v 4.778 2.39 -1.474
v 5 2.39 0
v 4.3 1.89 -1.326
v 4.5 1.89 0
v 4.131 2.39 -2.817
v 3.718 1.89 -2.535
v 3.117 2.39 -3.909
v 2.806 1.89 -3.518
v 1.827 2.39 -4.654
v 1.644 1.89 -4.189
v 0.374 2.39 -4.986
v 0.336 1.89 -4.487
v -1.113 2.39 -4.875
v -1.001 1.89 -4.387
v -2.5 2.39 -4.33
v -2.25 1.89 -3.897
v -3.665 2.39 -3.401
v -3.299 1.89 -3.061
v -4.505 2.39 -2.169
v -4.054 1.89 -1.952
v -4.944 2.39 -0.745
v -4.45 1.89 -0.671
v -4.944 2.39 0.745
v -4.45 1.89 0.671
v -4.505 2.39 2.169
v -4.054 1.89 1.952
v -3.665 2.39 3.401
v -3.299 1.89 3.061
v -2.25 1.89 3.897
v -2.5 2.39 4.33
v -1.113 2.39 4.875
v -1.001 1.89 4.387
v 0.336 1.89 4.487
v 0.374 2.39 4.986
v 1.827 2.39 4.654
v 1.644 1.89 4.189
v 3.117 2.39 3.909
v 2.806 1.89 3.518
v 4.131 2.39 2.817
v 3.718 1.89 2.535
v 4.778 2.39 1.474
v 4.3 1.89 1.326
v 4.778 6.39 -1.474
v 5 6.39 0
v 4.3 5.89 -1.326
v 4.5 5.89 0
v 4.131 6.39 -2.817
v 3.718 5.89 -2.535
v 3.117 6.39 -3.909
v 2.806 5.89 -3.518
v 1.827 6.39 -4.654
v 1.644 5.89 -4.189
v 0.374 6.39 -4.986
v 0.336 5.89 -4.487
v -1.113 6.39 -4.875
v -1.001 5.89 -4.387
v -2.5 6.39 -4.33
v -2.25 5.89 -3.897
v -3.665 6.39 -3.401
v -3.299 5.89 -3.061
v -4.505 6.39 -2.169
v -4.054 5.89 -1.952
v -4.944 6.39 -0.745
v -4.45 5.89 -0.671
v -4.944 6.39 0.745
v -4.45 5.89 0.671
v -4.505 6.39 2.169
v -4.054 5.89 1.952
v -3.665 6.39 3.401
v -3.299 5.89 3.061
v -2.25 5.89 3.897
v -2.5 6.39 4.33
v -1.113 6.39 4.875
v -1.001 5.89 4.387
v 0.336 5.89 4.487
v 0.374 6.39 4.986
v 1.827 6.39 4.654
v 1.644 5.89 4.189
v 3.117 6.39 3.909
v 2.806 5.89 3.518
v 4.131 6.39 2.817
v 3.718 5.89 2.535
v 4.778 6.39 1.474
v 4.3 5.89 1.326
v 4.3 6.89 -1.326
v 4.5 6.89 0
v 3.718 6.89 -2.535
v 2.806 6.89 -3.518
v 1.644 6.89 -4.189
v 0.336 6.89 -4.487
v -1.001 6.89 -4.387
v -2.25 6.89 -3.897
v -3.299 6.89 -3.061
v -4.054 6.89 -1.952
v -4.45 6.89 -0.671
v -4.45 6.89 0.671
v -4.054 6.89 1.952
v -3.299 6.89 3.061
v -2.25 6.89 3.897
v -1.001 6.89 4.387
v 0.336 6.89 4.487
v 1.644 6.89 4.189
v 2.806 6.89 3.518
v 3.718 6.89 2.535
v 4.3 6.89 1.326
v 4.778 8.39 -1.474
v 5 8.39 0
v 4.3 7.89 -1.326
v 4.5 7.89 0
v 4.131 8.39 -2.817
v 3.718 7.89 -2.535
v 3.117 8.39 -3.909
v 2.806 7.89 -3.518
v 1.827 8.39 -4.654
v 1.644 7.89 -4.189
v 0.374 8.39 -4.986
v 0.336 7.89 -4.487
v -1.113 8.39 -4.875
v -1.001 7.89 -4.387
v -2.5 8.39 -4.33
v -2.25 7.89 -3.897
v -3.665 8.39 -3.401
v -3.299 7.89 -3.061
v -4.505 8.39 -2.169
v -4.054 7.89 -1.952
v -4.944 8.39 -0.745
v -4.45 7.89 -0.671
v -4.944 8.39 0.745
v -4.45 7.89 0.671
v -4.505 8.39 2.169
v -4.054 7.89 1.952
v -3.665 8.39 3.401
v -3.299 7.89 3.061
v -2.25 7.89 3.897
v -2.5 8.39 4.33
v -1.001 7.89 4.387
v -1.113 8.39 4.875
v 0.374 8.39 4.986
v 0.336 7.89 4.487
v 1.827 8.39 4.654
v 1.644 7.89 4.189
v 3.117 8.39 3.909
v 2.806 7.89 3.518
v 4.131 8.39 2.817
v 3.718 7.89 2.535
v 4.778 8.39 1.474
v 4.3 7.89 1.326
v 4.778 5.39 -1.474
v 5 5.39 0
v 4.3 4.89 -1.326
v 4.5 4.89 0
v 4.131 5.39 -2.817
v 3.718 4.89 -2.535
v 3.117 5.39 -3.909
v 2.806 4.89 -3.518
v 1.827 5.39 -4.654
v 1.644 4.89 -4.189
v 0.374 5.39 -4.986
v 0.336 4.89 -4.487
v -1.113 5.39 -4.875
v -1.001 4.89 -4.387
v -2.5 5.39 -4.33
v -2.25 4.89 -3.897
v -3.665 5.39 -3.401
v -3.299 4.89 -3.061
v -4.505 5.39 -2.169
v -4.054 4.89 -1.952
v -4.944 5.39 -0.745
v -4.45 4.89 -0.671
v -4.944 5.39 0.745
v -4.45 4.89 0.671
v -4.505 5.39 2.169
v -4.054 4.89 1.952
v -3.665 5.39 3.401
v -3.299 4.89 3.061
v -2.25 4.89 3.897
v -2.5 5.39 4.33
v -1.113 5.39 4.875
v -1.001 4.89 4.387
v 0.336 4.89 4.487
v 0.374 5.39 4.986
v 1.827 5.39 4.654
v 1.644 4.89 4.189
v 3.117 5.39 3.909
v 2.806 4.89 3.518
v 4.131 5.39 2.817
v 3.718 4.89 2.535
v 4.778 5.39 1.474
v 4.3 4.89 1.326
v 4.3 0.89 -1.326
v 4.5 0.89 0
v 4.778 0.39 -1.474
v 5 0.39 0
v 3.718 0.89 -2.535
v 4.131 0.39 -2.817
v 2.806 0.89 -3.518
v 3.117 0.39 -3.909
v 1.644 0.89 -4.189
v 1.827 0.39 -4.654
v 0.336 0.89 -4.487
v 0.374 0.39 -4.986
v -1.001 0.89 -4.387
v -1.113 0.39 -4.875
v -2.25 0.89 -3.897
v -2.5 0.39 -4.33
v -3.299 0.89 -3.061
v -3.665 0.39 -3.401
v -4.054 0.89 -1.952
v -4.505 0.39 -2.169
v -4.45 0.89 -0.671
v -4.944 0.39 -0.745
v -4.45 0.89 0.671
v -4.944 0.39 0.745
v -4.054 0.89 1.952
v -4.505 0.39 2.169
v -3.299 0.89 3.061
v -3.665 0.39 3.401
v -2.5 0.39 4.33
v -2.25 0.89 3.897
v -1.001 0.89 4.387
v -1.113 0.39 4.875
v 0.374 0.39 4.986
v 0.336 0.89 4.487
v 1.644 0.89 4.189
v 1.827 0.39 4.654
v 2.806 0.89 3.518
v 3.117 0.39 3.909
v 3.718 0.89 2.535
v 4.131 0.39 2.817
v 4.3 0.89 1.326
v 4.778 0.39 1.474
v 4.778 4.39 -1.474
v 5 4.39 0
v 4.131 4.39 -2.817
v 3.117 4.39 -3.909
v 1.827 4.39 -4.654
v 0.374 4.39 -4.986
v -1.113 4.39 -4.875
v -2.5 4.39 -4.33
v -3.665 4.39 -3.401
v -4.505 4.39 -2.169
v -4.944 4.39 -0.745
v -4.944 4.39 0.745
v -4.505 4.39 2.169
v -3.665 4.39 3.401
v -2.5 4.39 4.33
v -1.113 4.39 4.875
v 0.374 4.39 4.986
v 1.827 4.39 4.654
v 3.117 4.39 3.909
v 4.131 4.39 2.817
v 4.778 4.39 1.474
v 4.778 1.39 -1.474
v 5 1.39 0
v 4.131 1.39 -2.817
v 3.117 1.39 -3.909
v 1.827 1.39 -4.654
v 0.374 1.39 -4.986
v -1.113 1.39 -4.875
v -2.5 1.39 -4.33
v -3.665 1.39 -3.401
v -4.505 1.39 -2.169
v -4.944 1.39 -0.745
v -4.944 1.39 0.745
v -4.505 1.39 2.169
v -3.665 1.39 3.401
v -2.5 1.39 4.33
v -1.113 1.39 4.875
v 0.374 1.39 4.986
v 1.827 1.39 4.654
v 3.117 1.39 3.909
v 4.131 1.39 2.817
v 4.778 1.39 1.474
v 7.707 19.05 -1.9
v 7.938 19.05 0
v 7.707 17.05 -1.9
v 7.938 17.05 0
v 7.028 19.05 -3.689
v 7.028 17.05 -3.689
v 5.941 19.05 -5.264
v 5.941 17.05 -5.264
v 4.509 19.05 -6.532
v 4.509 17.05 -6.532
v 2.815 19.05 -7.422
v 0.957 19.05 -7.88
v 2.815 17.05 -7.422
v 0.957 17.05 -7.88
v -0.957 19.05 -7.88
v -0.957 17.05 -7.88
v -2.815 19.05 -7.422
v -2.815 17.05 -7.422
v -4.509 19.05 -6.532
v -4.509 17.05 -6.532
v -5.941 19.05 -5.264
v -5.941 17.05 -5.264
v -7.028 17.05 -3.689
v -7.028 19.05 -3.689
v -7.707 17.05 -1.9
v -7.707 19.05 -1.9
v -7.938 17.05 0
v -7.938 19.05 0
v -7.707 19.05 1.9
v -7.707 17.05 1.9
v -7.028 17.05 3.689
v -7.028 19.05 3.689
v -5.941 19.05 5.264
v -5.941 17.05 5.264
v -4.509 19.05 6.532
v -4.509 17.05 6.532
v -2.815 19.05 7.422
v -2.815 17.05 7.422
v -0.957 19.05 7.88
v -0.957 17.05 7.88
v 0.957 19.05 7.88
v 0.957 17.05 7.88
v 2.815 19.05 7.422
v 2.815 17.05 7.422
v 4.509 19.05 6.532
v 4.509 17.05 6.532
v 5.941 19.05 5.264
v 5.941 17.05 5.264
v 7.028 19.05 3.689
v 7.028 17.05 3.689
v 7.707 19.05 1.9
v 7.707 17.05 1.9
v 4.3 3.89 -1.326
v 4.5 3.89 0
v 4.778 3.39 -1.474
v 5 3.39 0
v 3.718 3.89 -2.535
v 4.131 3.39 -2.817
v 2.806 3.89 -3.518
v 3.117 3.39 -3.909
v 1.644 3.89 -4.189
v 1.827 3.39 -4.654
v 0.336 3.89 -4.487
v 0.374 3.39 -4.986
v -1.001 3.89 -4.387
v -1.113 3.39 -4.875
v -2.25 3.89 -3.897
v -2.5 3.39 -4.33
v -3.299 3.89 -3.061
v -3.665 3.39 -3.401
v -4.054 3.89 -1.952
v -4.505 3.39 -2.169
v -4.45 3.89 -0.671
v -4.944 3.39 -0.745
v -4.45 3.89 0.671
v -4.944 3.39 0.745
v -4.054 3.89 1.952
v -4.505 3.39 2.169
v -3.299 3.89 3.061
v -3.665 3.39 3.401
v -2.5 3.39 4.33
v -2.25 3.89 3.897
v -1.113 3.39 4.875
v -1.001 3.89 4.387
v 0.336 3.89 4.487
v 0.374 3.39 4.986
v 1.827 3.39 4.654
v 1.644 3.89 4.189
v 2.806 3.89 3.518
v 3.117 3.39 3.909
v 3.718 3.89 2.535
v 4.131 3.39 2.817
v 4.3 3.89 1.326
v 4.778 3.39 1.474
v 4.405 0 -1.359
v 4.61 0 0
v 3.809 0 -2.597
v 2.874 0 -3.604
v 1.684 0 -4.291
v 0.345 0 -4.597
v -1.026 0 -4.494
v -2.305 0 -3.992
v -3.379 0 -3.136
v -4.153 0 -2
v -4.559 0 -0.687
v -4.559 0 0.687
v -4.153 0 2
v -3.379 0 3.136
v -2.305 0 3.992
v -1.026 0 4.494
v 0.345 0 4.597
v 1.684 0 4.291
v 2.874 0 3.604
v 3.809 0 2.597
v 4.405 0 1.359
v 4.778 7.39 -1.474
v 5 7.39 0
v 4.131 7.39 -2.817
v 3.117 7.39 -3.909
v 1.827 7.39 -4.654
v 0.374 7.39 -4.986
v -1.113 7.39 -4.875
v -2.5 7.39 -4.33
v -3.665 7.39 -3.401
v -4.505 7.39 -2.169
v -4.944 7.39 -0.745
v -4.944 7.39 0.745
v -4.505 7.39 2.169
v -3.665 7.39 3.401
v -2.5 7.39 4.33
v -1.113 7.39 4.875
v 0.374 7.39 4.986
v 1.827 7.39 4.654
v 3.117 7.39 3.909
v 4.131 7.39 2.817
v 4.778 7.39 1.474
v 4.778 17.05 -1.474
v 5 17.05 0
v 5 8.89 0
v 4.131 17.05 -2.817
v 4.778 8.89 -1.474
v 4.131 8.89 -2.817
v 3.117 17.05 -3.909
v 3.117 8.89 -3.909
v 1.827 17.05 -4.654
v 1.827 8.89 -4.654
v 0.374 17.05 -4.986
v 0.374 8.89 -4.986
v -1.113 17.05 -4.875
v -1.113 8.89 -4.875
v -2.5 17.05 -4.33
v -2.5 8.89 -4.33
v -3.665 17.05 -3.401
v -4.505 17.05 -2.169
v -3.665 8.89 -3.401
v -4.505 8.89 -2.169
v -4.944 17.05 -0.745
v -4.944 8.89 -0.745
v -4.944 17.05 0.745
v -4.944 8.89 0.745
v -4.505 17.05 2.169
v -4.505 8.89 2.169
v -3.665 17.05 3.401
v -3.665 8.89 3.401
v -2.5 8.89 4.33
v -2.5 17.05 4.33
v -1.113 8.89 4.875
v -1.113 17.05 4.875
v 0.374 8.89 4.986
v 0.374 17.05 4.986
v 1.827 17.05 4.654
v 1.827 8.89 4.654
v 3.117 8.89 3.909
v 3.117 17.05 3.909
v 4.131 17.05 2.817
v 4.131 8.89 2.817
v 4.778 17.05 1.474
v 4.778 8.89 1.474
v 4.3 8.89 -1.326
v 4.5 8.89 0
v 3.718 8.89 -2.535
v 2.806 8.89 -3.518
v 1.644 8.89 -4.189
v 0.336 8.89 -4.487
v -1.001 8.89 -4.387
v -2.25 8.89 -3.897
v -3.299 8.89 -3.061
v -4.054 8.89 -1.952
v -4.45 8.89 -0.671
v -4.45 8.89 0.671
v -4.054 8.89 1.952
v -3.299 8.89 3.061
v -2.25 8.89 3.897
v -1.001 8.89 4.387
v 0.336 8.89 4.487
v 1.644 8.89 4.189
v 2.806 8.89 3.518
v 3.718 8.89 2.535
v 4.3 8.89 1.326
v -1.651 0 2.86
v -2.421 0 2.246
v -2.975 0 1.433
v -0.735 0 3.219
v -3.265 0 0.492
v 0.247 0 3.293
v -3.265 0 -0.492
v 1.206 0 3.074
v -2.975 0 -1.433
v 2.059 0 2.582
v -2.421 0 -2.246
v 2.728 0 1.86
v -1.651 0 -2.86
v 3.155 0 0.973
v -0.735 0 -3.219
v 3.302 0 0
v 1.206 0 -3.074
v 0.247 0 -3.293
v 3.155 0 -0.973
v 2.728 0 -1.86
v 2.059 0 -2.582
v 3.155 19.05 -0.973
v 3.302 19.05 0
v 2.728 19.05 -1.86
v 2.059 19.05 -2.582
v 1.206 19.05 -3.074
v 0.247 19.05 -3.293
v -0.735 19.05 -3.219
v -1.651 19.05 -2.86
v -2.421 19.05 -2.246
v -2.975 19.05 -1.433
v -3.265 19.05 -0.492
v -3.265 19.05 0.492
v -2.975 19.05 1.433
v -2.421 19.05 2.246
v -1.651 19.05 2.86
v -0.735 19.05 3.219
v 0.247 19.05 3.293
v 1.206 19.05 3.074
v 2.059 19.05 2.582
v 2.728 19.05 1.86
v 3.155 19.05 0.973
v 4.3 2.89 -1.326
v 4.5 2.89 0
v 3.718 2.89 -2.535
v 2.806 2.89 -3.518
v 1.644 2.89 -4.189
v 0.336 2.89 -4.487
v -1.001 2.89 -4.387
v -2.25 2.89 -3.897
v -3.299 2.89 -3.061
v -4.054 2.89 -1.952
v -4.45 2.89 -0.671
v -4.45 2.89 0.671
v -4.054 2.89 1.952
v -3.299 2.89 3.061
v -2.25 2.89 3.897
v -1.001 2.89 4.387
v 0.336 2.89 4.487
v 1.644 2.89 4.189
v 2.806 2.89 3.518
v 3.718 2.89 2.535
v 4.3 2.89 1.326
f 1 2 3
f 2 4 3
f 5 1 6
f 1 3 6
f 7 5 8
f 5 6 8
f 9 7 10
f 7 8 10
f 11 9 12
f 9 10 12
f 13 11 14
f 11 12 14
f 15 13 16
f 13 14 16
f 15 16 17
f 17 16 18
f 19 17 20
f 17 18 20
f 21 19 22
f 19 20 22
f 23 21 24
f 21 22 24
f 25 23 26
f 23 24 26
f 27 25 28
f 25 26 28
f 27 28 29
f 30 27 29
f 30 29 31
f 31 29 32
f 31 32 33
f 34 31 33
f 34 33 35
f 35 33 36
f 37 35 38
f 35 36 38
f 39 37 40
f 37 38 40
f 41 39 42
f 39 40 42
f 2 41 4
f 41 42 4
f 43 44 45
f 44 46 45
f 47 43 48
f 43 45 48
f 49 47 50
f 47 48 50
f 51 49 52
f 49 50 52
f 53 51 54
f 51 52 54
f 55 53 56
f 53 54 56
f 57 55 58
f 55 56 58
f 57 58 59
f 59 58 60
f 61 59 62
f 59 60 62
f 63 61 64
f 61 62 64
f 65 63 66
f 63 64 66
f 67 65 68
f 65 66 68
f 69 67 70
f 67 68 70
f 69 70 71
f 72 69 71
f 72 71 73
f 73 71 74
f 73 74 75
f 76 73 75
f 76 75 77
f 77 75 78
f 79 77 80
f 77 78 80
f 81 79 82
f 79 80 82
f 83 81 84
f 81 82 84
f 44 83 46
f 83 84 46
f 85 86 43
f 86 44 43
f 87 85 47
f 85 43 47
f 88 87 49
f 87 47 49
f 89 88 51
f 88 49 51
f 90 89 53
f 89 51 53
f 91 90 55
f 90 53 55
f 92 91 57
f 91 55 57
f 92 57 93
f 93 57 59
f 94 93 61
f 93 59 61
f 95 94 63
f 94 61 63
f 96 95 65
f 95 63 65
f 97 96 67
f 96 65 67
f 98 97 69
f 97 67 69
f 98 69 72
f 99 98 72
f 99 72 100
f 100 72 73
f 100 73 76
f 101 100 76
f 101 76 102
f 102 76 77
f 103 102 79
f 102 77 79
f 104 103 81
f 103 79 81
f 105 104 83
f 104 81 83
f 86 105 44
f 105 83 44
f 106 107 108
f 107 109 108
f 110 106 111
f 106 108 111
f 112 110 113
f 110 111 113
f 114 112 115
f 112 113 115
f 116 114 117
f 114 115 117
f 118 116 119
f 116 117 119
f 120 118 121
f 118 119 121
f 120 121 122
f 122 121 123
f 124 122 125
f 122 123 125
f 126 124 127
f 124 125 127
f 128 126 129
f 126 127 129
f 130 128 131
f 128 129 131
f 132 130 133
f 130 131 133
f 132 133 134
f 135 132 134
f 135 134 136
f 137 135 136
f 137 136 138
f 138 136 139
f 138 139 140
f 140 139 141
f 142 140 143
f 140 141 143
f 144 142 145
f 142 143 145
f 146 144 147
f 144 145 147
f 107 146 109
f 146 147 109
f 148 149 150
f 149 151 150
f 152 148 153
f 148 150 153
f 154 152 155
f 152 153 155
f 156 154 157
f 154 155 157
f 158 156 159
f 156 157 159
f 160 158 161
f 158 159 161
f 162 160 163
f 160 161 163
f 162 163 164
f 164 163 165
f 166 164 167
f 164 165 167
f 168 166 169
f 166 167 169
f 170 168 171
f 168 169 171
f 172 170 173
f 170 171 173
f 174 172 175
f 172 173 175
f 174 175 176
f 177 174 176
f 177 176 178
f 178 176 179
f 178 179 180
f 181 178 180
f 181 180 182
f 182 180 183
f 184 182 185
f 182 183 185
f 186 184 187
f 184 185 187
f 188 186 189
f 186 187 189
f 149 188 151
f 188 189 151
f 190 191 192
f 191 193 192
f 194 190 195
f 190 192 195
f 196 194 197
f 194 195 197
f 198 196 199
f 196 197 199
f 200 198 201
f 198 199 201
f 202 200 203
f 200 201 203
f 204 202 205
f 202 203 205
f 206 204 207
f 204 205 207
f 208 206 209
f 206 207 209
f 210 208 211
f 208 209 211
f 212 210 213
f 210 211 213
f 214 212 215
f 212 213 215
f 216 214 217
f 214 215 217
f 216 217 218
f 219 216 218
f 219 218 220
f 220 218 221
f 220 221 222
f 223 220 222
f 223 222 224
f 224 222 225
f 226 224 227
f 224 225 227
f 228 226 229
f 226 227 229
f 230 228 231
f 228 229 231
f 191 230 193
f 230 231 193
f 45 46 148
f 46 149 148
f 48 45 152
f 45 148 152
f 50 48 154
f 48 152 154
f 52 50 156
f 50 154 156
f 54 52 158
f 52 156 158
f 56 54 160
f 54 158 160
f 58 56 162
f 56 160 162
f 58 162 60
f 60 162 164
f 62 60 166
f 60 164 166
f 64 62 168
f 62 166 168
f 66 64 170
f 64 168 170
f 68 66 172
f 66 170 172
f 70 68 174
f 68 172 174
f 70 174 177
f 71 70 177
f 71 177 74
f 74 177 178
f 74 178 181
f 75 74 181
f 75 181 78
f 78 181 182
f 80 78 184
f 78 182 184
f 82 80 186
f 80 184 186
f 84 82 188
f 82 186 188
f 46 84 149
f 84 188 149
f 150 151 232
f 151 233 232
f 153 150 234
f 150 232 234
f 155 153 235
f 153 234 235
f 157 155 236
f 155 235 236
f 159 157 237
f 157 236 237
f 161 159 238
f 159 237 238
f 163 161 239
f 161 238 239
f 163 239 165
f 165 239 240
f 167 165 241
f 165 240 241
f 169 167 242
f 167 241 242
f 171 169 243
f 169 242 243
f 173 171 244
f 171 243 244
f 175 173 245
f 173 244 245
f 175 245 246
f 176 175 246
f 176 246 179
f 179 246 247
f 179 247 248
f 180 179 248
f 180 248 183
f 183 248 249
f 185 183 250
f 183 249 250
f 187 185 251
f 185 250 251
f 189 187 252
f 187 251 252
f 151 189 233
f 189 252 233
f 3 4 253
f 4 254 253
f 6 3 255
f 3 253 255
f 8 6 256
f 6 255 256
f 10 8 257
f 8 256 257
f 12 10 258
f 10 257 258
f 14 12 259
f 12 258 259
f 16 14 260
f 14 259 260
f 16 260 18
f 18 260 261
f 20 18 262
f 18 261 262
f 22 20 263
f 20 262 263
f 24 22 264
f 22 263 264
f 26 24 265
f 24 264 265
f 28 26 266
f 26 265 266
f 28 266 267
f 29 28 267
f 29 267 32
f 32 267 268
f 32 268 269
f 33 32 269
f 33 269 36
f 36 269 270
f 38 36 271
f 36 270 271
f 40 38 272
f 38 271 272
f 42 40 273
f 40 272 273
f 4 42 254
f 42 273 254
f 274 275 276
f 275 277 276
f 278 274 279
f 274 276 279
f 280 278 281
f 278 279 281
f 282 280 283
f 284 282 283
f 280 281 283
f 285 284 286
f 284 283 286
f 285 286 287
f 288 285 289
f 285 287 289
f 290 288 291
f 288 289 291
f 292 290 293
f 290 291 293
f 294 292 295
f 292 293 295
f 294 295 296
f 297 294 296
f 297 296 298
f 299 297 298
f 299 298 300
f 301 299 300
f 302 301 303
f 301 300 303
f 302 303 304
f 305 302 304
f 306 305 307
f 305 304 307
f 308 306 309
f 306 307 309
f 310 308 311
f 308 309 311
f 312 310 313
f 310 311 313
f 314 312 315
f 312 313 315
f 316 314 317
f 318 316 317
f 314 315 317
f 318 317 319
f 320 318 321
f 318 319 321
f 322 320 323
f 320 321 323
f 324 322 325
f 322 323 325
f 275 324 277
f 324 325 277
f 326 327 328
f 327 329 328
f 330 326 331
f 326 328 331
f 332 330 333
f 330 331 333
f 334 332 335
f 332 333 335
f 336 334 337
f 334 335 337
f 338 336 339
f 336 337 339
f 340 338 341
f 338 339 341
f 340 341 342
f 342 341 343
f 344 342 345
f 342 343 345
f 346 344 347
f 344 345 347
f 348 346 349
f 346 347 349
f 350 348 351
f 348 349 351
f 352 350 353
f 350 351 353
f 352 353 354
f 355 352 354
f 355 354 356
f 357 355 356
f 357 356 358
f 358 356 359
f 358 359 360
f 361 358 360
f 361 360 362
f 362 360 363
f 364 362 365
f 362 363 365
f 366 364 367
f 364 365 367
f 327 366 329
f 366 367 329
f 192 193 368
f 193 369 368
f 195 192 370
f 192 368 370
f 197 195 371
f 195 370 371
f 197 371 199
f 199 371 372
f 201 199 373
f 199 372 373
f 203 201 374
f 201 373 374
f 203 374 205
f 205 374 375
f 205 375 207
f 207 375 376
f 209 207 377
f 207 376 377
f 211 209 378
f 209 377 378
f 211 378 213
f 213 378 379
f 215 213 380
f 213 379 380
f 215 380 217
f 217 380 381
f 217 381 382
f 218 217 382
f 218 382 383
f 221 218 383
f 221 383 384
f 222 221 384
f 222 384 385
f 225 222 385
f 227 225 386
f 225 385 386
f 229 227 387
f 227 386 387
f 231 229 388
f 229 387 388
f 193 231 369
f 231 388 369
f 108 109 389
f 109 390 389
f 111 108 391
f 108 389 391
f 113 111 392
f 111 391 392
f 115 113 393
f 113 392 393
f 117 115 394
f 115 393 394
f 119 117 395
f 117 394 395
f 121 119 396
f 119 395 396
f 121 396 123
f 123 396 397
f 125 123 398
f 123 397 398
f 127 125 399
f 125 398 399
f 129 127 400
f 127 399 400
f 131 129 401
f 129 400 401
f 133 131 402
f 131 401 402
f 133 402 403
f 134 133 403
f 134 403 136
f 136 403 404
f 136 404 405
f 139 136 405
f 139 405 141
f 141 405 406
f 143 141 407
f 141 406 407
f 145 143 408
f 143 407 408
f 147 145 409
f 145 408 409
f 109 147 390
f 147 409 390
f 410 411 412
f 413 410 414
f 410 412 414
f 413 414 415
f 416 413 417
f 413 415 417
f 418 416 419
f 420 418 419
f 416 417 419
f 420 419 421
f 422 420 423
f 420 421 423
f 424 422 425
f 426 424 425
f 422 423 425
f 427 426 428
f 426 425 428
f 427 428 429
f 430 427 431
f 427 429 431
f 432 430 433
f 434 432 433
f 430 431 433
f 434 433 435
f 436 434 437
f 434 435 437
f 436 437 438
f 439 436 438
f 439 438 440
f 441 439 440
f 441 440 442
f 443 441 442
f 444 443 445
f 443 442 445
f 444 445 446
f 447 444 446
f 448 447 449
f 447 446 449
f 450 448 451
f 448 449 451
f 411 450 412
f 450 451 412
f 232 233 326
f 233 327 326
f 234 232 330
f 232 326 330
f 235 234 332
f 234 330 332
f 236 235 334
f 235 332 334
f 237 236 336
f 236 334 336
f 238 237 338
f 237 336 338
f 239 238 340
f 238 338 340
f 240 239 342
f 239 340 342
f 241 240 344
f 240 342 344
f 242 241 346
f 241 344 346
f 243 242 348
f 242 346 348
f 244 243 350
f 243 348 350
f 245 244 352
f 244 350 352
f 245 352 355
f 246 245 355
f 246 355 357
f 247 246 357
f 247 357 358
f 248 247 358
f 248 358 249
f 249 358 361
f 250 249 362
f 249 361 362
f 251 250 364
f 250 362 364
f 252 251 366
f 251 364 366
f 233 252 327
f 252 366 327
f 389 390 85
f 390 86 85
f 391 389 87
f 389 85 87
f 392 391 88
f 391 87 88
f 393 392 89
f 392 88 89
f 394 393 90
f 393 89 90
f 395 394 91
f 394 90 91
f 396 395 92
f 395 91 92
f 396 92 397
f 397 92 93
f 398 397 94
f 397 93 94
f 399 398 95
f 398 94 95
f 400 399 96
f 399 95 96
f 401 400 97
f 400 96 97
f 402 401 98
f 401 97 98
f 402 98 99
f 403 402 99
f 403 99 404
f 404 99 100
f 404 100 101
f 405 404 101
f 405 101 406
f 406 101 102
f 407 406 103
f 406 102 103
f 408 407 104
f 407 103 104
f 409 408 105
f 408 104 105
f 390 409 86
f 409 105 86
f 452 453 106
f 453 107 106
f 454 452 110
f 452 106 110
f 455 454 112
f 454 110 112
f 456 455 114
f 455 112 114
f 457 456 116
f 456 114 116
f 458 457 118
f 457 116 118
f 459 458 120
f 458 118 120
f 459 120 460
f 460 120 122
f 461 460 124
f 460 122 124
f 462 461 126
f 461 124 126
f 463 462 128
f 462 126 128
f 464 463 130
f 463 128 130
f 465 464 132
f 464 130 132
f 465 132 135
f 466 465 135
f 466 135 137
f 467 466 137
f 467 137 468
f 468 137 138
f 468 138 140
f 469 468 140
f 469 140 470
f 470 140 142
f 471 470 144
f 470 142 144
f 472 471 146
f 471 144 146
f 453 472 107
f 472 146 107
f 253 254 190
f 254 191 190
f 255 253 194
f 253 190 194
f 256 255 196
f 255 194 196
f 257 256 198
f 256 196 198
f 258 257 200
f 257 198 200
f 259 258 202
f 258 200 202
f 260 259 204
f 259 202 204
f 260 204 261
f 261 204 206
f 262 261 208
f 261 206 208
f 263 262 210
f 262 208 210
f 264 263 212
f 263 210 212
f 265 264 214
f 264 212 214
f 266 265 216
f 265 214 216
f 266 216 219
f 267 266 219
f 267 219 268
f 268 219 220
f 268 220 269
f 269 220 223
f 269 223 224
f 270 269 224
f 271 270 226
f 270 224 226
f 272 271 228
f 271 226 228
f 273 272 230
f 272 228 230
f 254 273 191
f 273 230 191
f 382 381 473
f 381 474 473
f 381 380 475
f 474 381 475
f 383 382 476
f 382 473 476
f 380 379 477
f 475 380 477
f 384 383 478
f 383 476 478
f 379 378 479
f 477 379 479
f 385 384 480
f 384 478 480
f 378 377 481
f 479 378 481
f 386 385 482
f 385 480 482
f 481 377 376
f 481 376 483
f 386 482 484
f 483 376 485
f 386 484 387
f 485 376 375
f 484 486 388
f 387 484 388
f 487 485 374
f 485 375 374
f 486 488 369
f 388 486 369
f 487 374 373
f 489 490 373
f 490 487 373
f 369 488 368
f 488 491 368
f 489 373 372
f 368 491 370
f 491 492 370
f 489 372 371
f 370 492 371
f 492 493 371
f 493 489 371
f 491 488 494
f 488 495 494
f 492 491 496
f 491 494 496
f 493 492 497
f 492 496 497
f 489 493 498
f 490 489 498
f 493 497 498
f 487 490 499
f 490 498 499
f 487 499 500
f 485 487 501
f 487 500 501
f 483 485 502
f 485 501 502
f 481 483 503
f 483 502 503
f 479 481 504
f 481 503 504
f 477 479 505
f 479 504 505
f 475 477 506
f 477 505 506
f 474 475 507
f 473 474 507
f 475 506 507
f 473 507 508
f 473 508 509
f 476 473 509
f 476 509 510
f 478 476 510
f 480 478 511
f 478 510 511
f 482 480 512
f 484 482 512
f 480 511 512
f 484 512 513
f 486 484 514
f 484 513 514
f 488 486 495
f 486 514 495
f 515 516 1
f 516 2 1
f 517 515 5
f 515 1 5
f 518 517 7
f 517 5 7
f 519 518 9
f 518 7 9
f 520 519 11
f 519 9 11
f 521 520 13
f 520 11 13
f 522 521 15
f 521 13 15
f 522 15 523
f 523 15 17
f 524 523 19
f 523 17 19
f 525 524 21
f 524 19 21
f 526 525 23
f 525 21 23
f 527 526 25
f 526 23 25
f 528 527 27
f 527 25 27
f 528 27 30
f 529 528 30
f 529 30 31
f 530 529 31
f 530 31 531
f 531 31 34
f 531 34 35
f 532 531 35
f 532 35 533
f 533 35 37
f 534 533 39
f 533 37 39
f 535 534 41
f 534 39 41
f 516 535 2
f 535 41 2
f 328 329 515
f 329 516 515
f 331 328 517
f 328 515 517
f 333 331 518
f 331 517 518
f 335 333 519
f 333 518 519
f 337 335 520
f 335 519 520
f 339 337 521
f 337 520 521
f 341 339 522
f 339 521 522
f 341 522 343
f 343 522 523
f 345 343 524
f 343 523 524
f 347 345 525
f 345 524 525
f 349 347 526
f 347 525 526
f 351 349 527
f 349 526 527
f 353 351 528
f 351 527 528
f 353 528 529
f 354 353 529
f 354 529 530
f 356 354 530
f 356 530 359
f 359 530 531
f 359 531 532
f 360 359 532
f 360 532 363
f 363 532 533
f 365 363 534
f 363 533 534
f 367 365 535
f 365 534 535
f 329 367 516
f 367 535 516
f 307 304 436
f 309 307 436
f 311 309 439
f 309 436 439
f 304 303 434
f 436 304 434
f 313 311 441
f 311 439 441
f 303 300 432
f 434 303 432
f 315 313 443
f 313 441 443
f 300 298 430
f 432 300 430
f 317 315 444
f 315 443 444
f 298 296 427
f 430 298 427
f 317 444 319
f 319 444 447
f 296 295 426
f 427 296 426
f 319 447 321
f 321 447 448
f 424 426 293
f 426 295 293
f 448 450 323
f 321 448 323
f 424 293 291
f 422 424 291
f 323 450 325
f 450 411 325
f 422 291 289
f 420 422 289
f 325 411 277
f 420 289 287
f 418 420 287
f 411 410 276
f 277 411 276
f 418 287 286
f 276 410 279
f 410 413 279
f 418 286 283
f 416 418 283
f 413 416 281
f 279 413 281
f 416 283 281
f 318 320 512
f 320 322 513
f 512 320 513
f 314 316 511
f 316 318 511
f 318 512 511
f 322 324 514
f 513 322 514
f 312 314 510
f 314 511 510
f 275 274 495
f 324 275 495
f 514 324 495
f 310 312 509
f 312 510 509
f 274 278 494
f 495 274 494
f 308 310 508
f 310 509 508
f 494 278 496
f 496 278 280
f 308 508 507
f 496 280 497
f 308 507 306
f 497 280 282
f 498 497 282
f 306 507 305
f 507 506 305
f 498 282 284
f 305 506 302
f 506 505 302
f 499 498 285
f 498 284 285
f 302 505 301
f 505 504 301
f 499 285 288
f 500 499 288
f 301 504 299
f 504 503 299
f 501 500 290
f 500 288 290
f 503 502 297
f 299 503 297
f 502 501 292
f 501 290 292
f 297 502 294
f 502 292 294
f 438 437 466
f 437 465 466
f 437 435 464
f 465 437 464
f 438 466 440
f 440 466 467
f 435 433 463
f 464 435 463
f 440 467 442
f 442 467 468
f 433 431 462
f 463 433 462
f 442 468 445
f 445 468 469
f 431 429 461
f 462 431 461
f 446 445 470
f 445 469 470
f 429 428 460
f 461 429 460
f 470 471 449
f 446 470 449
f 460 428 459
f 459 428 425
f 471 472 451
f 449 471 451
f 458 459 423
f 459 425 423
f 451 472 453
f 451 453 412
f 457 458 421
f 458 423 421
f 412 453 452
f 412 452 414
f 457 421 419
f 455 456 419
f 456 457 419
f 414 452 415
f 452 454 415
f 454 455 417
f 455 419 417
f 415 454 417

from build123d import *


with BuildPart() as part:
    # Sketch1 → Revolve1 (revolve)
    with BuildSketch(Plane.XY):
        Polygon((3.302, 0), (3.302, 19.05), (7.9375, 19.05), (7.9375, 17.05), (5, 17.05), (5, 8.89), (4.5, 8.89), (5, 8.39), (4.5, 7.89), (5, 7.39), (4.5, 6.89), (5, 6.39), (4.5, 5.89), (5, 5.39), (4.5, 4.89), (5, 4.39), (4.5, 3.89), (5, 3.39), (4.5, 2.89), (5, 2.39), (4.5, 1.89), (5, 1.39), (4.5, 0.89), (5, 0.39), (4.61, 0), align=None)
    revolve(axis=Axis((0, 0, 0), (0, 1, 0)))


solid = part.part
